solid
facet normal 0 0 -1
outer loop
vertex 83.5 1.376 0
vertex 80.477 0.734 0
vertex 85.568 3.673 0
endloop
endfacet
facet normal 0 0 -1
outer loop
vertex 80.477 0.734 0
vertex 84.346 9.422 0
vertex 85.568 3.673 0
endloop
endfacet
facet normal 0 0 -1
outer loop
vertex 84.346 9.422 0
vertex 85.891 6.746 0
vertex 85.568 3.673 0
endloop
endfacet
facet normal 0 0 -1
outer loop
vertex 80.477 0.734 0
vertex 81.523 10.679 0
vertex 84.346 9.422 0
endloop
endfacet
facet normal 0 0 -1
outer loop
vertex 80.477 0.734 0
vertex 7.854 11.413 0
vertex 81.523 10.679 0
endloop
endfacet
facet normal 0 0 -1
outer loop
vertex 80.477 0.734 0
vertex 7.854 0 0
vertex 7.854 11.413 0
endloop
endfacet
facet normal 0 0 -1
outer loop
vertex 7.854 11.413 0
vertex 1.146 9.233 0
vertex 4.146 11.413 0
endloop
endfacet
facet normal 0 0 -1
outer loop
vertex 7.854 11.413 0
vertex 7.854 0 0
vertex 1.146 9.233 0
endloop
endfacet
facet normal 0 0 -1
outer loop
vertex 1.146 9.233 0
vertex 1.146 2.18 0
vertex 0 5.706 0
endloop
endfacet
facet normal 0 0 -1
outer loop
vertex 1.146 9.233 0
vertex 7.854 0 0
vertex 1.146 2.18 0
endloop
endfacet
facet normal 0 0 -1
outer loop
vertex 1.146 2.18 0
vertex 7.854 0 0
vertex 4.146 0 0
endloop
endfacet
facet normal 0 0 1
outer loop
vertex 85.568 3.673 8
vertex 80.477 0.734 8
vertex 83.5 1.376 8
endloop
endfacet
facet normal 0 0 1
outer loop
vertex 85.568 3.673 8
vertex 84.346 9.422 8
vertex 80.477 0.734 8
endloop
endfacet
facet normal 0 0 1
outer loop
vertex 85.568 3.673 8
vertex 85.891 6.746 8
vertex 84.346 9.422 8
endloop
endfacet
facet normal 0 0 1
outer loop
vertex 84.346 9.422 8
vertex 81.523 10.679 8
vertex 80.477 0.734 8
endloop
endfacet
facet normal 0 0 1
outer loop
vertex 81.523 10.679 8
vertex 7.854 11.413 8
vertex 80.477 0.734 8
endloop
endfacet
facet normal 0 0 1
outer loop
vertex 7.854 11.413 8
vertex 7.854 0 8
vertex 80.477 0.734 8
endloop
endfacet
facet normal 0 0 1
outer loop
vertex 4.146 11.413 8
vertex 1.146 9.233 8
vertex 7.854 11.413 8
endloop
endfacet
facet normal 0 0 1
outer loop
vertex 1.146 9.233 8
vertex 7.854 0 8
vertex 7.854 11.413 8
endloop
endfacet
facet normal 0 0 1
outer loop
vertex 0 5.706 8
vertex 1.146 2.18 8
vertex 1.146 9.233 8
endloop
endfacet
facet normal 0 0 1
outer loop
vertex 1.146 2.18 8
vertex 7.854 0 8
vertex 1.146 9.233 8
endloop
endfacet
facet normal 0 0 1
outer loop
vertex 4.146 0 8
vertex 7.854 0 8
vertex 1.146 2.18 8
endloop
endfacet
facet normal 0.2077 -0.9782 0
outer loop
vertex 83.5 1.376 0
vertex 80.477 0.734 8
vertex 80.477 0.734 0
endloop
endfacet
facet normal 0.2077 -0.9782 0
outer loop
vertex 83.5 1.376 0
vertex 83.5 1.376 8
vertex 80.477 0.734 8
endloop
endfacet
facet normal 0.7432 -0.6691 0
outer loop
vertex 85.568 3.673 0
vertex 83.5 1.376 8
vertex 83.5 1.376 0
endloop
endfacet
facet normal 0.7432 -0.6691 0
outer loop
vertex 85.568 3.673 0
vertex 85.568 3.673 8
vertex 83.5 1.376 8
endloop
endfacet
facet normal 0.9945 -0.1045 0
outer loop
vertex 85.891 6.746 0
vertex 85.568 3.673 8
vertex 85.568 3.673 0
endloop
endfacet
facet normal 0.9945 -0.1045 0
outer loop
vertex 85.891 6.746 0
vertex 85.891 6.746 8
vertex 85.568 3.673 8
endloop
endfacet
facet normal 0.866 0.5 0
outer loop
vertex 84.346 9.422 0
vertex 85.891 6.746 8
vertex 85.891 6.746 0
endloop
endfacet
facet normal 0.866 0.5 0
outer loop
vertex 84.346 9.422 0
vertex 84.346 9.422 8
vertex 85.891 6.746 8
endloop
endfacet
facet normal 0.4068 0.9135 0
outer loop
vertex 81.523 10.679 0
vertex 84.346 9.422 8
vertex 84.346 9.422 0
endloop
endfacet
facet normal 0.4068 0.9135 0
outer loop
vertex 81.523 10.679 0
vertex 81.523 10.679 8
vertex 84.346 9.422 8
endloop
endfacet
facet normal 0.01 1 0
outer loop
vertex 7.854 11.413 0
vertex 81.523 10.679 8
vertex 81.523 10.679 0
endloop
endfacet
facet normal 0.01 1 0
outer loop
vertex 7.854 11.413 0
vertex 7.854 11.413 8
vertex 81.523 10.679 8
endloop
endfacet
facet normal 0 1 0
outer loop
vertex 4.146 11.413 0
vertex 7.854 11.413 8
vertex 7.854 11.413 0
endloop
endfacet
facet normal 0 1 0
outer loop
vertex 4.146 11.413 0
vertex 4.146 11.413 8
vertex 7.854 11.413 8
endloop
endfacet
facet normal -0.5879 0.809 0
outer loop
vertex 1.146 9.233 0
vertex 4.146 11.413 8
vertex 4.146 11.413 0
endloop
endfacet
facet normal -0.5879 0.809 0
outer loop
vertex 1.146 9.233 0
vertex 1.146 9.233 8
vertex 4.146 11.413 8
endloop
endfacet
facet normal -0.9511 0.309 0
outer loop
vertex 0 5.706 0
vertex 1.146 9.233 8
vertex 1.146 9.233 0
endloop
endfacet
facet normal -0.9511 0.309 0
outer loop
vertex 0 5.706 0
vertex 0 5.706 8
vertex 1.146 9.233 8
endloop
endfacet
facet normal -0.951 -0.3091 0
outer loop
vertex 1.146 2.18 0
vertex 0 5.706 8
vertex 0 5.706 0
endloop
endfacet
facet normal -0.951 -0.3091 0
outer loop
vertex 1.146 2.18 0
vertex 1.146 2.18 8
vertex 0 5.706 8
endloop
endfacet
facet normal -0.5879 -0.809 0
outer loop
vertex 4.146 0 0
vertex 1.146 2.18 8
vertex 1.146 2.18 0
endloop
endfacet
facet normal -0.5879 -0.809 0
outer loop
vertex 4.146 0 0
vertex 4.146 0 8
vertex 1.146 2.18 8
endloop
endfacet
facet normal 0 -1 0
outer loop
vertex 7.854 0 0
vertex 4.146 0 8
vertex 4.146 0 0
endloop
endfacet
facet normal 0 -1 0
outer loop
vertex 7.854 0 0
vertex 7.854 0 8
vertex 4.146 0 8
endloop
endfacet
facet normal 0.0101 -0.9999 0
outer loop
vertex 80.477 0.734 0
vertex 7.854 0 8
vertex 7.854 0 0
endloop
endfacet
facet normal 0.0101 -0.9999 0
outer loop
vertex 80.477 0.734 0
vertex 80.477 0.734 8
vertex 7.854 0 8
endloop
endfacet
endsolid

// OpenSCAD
$fn = 32;

// ----------------------------------------------------------------------
// Lever arm: two bosses 12 and 10 mm, 75 mm between centres
// ----------------------------------------------------------------------

// --- parameters (mm) ---
profile_height = 8;       // extrusion height
profile_points = 13;      // points of the closed outline

profile = [[0, 5.706], [1.146, 2.18], [4.146, 0], [7.854, 0], [80.477, 0.734], [83.5, 1.376], [85.568, 3.673], [85.891, 6.746], [84.346, 9.422], [81.523, 10.679], [7.854, 11.413], [4.146, 11.413], [1.146, 9.233]];  // single closed polygon, 13 points, counter clockwise

// --- the one profile operation ---
linear_extrude(height = profile_height) polygon(points = profile);
